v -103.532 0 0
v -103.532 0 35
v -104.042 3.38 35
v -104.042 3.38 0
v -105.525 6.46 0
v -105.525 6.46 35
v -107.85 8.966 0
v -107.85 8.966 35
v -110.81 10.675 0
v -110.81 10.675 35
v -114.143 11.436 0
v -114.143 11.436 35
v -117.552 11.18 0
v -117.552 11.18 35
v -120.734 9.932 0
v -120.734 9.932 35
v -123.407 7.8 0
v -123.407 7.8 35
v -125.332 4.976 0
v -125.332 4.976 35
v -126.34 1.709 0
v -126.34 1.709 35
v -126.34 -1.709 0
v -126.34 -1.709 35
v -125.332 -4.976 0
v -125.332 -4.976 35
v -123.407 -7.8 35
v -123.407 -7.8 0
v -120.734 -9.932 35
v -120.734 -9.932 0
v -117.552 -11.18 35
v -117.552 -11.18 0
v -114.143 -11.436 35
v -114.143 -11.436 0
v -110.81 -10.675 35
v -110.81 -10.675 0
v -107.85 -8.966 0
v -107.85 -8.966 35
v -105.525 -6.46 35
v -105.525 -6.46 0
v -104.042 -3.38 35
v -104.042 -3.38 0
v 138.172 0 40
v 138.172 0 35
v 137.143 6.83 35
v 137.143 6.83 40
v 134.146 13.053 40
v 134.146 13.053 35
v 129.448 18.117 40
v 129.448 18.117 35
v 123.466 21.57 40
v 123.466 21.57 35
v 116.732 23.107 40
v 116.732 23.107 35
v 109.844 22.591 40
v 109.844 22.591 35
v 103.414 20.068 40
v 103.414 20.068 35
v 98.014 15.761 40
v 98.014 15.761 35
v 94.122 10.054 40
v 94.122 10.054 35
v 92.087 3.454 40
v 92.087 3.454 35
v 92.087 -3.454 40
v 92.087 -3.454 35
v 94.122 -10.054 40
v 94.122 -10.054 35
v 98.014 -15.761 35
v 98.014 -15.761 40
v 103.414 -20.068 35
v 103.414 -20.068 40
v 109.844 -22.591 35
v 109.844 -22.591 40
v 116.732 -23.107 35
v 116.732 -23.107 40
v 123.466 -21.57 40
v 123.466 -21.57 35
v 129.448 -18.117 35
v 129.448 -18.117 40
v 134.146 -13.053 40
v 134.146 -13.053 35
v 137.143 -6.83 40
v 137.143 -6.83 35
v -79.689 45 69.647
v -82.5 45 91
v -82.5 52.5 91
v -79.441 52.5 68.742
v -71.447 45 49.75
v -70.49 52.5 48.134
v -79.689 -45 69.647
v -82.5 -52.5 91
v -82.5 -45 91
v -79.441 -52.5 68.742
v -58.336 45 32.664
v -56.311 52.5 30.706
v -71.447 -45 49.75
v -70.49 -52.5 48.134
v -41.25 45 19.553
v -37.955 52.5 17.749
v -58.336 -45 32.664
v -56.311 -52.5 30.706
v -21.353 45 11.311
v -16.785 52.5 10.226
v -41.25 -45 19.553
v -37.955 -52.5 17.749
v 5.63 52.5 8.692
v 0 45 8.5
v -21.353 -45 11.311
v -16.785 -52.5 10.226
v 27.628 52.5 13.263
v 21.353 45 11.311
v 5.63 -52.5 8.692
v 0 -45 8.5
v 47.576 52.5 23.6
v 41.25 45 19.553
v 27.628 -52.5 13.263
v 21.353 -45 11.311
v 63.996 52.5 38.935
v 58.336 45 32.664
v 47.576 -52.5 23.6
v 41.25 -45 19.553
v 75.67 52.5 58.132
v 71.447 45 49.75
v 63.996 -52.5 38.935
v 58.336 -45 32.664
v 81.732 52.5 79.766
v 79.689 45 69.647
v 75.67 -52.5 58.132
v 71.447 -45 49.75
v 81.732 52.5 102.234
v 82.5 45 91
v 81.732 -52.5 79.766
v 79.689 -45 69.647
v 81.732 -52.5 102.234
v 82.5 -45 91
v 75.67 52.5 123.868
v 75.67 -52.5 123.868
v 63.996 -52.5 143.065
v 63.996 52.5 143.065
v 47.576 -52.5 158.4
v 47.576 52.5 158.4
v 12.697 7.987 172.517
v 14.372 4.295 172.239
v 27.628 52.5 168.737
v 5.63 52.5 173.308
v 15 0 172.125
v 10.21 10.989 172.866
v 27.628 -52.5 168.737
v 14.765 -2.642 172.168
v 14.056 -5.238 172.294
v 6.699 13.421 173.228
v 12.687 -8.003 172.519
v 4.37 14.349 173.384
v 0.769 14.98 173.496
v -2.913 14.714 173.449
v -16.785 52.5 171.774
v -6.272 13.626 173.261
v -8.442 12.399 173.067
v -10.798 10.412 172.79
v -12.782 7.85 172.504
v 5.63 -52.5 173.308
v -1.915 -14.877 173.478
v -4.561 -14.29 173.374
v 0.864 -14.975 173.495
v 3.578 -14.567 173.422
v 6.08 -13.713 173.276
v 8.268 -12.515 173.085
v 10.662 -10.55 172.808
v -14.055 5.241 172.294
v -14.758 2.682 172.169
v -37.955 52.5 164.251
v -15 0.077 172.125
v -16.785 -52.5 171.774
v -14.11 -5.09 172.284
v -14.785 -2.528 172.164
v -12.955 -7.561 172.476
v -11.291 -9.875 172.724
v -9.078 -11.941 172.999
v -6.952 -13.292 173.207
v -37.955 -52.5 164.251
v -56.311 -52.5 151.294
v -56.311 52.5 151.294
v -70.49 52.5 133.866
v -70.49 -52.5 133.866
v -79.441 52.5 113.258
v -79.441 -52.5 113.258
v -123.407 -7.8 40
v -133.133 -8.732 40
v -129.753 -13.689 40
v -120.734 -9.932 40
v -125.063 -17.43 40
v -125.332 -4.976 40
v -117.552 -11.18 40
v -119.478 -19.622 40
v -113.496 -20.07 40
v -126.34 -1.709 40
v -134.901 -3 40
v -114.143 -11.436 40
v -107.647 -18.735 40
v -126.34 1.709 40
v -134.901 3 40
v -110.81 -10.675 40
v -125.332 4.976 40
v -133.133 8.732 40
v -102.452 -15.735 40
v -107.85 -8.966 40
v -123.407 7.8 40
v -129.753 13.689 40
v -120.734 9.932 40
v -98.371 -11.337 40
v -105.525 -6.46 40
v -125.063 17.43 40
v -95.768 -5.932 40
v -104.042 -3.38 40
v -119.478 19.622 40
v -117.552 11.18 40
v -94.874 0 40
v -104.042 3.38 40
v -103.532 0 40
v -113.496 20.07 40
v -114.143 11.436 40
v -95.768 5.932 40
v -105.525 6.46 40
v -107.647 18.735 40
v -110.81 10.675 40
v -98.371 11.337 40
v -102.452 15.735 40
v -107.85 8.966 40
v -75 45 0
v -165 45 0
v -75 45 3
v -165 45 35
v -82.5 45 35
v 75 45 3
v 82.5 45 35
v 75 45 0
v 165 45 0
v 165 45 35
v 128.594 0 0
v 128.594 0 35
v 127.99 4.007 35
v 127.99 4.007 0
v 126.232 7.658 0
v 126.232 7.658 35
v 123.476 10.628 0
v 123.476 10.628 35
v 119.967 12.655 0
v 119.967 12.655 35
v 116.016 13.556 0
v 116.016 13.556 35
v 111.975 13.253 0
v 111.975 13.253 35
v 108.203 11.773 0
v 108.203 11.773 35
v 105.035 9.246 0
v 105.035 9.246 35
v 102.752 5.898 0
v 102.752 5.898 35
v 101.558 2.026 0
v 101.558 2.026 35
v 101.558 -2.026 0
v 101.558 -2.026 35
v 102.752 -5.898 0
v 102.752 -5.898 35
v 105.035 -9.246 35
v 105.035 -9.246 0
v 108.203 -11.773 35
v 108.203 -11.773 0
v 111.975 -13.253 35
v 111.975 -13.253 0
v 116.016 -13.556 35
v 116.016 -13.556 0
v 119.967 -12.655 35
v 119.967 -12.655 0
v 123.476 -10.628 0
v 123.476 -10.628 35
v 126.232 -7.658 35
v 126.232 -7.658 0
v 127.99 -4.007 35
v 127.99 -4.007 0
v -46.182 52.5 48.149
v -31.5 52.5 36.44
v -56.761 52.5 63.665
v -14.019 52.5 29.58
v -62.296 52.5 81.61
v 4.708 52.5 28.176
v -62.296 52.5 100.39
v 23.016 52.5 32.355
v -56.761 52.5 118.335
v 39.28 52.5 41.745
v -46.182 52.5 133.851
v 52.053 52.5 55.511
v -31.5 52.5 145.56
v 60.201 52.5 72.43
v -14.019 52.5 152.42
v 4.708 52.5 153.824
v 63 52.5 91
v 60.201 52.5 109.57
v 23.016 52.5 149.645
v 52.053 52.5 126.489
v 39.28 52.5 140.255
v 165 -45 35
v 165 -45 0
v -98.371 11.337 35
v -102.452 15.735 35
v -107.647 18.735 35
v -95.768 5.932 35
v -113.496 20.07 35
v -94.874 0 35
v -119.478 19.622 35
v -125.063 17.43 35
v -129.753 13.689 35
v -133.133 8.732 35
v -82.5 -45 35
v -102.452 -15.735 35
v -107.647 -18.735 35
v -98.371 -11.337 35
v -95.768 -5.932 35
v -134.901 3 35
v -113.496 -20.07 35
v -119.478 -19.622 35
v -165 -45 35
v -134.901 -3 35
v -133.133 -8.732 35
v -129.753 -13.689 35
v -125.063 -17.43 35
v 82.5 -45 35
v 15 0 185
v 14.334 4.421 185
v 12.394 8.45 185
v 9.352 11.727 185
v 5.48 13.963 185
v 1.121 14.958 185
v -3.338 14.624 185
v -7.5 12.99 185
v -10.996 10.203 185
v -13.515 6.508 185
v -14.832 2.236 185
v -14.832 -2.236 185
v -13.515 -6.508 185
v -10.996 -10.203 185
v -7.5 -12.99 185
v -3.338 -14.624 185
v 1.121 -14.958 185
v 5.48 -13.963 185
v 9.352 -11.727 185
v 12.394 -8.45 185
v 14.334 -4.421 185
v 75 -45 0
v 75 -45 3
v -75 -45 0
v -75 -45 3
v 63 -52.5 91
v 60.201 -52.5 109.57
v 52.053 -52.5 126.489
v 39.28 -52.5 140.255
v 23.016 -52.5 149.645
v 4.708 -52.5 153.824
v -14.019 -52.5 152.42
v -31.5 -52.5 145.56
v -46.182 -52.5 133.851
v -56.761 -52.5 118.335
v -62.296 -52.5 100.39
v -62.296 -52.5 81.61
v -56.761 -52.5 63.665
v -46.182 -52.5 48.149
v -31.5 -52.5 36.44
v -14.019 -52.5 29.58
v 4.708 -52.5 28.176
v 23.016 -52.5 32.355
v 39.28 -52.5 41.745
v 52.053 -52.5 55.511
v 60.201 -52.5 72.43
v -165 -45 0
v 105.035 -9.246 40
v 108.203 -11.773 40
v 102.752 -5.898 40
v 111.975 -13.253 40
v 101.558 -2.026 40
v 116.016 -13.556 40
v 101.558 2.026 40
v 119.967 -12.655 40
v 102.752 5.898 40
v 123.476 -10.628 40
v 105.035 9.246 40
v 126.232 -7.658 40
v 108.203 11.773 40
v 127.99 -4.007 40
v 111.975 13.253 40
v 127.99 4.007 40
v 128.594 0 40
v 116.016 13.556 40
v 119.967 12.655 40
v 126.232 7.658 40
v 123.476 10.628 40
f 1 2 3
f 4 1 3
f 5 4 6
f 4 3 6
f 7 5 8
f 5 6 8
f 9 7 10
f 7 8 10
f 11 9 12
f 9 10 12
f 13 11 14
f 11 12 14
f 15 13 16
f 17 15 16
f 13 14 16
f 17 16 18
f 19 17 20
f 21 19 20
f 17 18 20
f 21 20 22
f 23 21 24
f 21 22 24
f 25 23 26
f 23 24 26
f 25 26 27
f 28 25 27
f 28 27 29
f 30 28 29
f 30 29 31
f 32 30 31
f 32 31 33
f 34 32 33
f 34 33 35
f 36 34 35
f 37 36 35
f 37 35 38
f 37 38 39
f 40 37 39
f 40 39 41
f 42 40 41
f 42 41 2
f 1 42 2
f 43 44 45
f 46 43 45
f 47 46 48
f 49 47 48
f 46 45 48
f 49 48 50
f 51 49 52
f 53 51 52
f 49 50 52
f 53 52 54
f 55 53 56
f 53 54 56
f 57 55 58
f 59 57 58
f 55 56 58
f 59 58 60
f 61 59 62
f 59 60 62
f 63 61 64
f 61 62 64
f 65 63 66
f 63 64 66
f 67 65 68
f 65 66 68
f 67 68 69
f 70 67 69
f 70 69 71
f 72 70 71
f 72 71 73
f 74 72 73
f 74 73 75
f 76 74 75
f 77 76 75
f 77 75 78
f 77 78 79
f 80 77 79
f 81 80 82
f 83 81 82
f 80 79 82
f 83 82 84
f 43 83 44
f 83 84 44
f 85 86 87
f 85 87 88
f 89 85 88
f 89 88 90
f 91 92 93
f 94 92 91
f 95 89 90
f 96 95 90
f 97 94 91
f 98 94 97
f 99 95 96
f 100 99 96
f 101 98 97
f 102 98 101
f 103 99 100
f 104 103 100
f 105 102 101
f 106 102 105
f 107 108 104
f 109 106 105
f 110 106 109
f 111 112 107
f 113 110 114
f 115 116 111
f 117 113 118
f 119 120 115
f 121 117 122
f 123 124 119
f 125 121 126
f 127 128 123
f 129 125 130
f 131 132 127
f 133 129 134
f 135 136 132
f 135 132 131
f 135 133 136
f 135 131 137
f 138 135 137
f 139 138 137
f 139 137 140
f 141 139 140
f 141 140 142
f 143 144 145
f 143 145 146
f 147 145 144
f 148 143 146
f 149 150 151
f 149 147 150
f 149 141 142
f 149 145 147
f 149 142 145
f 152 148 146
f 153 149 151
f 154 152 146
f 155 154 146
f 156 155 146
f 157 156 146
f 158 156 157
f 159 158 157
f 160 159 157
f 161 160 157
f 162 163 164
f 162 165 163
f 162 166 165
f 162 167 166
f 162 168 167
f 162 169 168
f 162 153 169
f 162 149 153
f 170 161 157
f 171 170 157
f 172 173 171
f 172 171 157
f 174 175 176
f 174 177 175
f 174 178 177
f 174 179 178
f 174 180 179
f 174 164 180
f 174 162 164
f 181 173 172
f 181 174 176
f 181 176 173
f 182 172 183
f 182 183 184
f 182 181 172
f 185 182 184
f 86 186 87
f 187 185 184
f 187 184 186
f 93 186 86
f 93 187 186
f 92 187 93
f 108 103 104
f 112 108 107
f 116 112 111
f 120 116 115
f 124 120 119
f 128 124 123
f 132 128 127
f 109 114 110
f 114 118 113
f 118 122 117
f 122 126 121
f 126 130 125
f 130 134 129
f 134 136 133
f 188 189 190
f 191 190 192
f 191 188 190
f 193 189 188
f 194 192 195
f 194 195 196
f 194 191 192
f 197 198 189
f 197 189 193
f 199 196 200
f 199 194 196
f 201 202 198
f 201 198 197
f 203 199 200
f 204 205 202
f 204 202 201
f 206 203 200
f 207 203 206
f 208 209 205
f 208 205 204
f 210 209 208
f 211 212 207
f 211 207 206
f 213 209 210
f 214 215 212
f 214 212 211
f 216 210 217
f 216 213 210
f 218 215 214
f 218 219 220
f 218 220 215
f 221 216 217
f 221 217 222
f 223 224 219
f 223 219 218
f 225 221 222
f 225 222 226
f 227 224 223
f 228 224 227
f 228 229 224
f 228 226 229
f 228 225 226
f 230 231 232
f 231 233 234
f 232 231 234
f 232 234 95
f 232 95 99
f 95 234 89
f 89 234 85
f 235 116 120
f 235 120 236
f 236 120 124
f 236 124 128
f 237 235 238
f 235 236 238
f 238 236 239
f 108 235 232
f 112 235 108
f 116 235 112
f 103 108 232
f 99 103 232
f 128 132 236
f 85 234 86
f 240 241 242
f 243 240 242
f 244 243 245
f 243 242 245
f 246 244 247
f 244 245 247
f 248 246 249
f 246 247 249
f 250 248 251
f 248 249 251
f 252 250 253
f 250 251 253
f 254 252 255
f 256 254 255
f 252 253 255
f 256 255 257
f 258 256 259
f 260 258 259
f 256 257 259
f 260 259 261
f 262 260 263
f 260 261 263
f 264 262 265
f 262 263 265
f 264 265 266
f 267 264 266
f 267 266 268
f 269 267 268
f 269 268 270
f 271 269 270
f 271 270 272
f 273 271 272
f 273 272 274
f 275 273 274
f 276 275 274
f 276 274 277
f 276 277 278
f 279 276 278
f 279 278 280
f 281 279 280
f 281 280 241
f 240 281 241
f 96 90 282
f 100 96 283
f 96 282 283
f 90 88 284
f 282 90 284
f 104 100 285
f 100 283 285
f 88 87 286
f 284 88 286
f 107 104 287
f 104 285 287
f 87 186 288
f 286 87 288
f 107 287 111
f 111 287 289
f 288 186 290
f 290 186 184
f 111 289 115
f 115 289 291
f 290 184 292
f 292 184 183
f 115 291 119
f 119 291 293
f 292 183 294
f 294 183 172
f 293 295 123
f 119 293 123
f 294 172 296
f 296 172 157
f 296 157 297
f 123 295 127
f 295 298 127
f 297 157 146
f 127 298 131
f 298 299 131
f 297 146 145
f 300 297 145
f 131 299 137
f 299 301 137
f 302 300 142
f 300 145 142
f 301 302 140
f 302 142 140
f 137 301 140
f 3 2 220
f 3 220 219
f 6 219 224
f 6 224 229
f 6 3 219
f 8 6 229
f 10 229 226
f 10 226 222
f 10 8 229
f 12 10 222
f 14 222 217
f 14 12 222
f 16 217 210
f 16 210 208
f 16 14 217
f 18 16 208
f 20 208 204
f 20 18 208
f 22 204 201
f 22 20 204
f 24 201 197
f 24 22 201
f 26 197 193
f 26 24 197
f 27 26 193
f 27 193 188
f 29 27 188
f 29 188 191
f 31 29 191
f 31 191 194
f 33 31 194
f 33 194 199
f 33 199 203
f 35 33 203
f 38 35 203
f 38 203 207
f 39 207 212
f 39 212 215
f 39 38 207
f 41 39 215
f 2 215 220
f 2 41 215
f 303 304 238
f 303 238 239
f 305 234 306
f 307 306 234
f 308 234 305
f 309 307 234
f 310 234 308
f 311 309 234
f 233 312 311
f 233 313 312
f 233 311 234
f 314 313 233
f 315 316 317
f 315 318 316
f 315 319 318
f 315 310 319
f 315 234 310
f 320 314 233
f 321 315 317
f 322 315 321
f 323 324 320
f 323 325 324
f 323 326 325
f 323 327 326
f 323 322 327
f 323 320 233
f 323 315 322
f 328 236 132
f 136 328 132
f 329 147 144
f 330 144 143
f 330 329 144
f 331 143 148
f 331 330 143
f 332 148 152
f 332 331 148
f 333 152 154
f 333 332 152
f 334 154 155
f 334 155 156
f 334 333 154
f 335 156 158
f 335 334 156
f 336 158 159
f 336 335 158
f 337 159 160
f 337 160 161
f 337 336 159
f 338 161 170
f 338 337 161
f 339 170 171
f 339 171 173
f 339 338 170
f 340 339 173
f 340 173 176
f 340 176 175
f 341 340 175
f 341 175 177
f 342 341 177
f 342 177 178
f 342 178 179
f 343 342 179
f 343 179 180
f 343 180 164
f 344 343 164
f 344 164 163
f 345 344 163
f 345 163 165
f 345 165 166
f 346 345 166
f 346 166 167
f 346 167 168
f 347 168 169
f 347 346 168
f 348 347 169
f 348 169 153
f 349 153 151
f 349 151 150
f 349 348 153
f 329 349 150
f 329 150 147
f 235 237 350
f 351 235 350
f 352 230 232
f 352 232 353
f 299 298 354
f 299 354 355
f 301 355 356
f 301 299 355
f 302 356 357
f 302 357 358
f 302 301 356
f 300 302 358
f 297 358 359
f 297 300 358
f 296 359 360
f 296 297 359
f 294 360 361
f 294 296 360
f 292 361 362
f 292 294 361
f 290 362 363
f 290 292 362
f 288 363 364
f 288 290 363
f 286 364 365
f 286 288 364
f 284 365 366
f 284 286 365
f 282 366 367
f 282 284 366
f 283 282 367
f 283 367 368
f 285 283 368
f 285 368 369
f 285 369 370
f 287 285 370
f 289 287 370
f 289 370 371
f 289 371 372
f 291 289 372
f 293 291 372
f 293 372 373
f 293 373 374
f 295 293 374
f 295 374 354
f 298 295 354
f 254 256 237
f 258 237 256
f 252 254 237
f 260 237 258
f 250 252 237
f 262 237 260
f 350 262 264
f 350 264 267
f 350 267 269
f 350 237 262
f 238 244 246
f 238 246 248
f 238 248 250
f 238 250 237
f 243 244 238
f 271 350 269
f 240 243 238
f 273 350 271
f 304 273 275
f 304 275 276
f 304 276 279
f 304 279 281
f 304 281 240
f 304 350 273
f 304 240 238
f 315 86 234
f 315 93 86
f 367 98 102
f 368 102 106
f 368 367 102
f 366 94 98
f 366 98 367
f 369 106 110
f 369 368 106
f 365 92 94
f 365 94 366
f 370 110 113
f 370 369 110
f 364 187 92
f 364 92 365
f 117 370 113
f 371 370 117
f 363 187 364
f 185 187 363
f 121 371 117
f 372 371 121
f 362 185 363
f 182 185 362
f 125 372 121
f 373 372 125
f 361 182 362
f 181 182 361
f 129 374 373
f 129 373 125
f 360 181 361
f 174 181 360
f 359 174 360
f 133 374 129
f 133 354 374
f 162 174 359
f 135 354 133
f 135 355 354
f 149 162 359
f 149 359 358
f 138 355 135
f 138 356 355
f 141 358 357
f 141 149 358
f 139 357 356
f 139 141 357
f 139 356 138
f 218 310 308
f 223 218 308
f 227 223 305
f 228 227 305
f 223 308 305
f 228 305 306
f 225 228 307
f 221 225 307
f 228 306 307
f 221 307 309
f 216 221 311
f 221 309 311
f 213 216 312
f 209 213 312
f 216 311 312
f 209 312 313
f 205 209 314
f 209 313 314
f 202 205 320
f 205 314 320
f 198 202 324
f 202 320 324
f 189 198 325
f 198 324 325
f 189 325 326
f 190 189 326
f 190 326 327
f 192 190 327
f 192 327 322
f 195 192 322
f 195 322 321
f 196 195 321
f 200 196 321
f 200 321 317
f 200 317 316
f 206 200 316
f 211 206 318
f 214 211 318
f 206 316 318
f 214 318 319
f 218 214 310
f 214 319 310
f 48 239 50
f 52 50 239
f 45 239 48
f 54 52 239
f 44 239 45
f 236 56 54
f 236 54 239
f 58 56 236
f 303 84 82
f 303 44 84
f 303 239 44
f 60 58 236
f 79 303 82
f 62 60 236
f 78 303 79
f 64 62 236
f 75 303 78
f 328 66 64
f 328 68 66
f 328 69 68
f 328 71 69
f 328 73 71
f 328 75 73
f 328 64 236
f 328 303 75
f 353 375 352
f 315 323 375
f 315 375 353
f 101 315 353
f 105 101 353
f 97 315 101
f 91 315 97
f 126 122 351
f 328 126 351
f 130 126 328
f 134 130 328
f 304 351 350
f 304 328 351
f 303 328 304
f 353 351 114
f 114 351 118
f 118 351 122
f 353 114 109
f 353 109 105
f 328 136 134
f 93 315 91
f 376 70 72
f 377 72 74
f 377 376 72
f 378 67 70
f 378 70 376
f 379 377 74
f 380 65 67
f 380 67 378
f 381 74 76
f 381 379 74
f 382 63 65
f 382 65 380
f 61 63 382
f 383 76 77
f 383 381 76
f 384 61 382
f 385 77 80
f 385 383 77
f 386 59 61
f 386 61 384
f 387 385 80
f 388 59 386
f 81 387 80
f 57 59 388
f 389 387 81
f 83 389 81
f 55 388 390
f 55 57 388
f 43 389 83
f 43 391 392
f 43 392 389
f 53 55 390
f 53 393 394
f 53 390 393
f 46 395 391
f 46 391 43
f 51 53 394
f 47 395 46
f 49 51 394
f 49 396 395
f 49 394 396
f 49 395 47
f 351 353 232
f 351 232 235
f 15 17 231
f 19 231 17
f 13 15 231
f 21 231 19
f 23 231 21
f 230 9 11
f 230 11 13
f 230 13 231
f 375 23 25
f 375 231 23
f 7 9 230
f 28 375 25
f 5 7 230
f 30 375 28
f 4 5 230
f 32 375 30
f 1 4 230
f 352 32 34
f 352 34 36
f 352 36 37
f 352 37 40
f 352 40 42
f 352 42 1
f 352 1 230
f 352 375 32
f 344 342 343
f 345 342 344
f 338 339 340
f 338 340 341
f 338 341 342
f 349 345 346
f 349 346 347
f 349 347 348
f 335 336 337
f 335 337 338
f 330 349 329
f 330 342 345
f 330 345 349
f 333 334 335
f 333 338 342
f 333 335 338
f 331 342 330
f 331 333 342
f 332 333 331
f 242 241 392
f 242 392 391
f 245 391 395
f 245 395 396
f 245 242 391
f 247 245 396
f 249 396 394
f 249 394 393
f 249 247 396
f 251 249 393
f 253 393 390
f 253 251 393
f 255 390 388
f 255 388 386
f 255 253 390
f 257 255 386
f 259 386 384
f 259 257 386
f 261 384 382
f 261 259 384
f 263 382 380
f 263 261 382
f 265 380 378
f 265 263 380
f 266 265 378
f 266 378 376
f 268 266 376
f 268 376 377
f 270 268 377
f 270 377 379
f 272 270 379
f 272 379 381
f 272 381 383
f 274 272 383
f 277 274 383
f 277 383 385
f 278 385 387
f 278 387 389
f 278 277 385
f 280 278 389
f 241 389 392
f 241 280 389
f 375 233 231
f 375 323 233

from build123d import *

# Parameters (mm, degrees)
F0_R      = 63
F1_DEPTH  = 52.5
F2_DEPTH  = 45
F3_R      = 13.5942815287
F4_DEPTH  = 50
F3_R_2    = 20.1261319814
F3_R_3    = 11.4679685697
F3_R_4    = 23.1722823774
F5_DEPTH  = 5
F6_DEPTH  = 50
F7_W      = 150
F7_H      = 90
F8_DEPTH  = 3
F10_R     = 15
F11_DEPTH = 25


with BuildPart() as f1:
    # F0 (on Front) → F1 (new body, symmetric)
    with BuildSketch(Plane.XZ):
        with BuildLine():
            ThreePointArc((82.5, 91), (0, 173.5), (-82.5, 91))
            ThreePointArc((-82.5, 91), (0, 8.5), (82.5, 91))
        make_face()
        with Locations((0, 91)):
            Circle(F0_R, mode=Mode.SUBTRACT)
    extrude(amount=F1_DEPTH, both=True)

    # F0 (on Front) → F2 (join, symmetric)
    with BuildSketch(Plane.XZ):
        with BuildLine():
            Line((-165, 0), (0, 0))
            Line((0, 0), (165, 0))
            Line((165, 0), (165, 35))
            Line((165, 35), (82.5, 35))
            Line((82.5, 35), (82.5, 91))
            ThreePointArc((82.5, 91), (0, 8.5), (-82.5, 91))
            Line((-82.5, 91), (-82.5, 35))
            Line((-82.5, 35), (-165, 35))
            Line((-165, 35), (-165, 0))
        make_face()
        with BuildLine():
            ThreePointArc((82.5, 91), (0, 173.5), (-82.5, 91))
            ThreePointArc((-82.5, 91), (0, 8.5), (82.5, 91))
        make_face()
        with Locations((0, 91)):
            Circle(F0_R, mode=Mode.SUBTRACT)
    extrude(amount=F2_DEPTH, both=True)

    # F3 (on face) → F4 (cut)
    with BuildSketch(Plane.XY.offset(35)):
        with Locations((115, 0)):
            Circle(F3_R)
    extrude(amount=-F4_DEPTH, mode=Mode.SUBTRACT)

    # F3 (on face) → F5 (join)
    with BuildSketch(Plane.XY.offset(35)):
        with Locations((-115, 0)):
            Circle(F3_R_2)
        with Locations((-115, 0)):
            Circle(F3_R_3, mode=Mode.SUBTRACT)
        with Locations((115, 0)):
            Circle(F3_R_4)
        with Locations((115, 0)):
            Circle(F3_R, mode=Mode.SUBTRACT)
    extrude(amount=F5_DEPTH)

    # F6 (cut): a face of the model
    f6_faces = [f1.faces().sort_by_distance(p)[0] for p in [
        (-115, 0, 35),
    ]]
    extrude(f6_faces, amount=-F6_DEPTH, mode=Mode.SUBTRACT)

    # F7 (on face) → F8 (cut)
    with BuildSketch(Plane(origin=(0, 0, 0), x_dir=(1, 0, 0), z_dir=(0, 0, -1))):
        Rectangle(F7_W, F7_H)
    extrude(amount=-F8_DEPTH, mode=Mode.SUBTRACT)

    # F10 (on offset) → F11 (join)
    with BuildSketch(Plane.XY.offset(185)):
        Circle(F10_R)
    extrude(amount=-F11_DEPTH)


solid = f1.part
